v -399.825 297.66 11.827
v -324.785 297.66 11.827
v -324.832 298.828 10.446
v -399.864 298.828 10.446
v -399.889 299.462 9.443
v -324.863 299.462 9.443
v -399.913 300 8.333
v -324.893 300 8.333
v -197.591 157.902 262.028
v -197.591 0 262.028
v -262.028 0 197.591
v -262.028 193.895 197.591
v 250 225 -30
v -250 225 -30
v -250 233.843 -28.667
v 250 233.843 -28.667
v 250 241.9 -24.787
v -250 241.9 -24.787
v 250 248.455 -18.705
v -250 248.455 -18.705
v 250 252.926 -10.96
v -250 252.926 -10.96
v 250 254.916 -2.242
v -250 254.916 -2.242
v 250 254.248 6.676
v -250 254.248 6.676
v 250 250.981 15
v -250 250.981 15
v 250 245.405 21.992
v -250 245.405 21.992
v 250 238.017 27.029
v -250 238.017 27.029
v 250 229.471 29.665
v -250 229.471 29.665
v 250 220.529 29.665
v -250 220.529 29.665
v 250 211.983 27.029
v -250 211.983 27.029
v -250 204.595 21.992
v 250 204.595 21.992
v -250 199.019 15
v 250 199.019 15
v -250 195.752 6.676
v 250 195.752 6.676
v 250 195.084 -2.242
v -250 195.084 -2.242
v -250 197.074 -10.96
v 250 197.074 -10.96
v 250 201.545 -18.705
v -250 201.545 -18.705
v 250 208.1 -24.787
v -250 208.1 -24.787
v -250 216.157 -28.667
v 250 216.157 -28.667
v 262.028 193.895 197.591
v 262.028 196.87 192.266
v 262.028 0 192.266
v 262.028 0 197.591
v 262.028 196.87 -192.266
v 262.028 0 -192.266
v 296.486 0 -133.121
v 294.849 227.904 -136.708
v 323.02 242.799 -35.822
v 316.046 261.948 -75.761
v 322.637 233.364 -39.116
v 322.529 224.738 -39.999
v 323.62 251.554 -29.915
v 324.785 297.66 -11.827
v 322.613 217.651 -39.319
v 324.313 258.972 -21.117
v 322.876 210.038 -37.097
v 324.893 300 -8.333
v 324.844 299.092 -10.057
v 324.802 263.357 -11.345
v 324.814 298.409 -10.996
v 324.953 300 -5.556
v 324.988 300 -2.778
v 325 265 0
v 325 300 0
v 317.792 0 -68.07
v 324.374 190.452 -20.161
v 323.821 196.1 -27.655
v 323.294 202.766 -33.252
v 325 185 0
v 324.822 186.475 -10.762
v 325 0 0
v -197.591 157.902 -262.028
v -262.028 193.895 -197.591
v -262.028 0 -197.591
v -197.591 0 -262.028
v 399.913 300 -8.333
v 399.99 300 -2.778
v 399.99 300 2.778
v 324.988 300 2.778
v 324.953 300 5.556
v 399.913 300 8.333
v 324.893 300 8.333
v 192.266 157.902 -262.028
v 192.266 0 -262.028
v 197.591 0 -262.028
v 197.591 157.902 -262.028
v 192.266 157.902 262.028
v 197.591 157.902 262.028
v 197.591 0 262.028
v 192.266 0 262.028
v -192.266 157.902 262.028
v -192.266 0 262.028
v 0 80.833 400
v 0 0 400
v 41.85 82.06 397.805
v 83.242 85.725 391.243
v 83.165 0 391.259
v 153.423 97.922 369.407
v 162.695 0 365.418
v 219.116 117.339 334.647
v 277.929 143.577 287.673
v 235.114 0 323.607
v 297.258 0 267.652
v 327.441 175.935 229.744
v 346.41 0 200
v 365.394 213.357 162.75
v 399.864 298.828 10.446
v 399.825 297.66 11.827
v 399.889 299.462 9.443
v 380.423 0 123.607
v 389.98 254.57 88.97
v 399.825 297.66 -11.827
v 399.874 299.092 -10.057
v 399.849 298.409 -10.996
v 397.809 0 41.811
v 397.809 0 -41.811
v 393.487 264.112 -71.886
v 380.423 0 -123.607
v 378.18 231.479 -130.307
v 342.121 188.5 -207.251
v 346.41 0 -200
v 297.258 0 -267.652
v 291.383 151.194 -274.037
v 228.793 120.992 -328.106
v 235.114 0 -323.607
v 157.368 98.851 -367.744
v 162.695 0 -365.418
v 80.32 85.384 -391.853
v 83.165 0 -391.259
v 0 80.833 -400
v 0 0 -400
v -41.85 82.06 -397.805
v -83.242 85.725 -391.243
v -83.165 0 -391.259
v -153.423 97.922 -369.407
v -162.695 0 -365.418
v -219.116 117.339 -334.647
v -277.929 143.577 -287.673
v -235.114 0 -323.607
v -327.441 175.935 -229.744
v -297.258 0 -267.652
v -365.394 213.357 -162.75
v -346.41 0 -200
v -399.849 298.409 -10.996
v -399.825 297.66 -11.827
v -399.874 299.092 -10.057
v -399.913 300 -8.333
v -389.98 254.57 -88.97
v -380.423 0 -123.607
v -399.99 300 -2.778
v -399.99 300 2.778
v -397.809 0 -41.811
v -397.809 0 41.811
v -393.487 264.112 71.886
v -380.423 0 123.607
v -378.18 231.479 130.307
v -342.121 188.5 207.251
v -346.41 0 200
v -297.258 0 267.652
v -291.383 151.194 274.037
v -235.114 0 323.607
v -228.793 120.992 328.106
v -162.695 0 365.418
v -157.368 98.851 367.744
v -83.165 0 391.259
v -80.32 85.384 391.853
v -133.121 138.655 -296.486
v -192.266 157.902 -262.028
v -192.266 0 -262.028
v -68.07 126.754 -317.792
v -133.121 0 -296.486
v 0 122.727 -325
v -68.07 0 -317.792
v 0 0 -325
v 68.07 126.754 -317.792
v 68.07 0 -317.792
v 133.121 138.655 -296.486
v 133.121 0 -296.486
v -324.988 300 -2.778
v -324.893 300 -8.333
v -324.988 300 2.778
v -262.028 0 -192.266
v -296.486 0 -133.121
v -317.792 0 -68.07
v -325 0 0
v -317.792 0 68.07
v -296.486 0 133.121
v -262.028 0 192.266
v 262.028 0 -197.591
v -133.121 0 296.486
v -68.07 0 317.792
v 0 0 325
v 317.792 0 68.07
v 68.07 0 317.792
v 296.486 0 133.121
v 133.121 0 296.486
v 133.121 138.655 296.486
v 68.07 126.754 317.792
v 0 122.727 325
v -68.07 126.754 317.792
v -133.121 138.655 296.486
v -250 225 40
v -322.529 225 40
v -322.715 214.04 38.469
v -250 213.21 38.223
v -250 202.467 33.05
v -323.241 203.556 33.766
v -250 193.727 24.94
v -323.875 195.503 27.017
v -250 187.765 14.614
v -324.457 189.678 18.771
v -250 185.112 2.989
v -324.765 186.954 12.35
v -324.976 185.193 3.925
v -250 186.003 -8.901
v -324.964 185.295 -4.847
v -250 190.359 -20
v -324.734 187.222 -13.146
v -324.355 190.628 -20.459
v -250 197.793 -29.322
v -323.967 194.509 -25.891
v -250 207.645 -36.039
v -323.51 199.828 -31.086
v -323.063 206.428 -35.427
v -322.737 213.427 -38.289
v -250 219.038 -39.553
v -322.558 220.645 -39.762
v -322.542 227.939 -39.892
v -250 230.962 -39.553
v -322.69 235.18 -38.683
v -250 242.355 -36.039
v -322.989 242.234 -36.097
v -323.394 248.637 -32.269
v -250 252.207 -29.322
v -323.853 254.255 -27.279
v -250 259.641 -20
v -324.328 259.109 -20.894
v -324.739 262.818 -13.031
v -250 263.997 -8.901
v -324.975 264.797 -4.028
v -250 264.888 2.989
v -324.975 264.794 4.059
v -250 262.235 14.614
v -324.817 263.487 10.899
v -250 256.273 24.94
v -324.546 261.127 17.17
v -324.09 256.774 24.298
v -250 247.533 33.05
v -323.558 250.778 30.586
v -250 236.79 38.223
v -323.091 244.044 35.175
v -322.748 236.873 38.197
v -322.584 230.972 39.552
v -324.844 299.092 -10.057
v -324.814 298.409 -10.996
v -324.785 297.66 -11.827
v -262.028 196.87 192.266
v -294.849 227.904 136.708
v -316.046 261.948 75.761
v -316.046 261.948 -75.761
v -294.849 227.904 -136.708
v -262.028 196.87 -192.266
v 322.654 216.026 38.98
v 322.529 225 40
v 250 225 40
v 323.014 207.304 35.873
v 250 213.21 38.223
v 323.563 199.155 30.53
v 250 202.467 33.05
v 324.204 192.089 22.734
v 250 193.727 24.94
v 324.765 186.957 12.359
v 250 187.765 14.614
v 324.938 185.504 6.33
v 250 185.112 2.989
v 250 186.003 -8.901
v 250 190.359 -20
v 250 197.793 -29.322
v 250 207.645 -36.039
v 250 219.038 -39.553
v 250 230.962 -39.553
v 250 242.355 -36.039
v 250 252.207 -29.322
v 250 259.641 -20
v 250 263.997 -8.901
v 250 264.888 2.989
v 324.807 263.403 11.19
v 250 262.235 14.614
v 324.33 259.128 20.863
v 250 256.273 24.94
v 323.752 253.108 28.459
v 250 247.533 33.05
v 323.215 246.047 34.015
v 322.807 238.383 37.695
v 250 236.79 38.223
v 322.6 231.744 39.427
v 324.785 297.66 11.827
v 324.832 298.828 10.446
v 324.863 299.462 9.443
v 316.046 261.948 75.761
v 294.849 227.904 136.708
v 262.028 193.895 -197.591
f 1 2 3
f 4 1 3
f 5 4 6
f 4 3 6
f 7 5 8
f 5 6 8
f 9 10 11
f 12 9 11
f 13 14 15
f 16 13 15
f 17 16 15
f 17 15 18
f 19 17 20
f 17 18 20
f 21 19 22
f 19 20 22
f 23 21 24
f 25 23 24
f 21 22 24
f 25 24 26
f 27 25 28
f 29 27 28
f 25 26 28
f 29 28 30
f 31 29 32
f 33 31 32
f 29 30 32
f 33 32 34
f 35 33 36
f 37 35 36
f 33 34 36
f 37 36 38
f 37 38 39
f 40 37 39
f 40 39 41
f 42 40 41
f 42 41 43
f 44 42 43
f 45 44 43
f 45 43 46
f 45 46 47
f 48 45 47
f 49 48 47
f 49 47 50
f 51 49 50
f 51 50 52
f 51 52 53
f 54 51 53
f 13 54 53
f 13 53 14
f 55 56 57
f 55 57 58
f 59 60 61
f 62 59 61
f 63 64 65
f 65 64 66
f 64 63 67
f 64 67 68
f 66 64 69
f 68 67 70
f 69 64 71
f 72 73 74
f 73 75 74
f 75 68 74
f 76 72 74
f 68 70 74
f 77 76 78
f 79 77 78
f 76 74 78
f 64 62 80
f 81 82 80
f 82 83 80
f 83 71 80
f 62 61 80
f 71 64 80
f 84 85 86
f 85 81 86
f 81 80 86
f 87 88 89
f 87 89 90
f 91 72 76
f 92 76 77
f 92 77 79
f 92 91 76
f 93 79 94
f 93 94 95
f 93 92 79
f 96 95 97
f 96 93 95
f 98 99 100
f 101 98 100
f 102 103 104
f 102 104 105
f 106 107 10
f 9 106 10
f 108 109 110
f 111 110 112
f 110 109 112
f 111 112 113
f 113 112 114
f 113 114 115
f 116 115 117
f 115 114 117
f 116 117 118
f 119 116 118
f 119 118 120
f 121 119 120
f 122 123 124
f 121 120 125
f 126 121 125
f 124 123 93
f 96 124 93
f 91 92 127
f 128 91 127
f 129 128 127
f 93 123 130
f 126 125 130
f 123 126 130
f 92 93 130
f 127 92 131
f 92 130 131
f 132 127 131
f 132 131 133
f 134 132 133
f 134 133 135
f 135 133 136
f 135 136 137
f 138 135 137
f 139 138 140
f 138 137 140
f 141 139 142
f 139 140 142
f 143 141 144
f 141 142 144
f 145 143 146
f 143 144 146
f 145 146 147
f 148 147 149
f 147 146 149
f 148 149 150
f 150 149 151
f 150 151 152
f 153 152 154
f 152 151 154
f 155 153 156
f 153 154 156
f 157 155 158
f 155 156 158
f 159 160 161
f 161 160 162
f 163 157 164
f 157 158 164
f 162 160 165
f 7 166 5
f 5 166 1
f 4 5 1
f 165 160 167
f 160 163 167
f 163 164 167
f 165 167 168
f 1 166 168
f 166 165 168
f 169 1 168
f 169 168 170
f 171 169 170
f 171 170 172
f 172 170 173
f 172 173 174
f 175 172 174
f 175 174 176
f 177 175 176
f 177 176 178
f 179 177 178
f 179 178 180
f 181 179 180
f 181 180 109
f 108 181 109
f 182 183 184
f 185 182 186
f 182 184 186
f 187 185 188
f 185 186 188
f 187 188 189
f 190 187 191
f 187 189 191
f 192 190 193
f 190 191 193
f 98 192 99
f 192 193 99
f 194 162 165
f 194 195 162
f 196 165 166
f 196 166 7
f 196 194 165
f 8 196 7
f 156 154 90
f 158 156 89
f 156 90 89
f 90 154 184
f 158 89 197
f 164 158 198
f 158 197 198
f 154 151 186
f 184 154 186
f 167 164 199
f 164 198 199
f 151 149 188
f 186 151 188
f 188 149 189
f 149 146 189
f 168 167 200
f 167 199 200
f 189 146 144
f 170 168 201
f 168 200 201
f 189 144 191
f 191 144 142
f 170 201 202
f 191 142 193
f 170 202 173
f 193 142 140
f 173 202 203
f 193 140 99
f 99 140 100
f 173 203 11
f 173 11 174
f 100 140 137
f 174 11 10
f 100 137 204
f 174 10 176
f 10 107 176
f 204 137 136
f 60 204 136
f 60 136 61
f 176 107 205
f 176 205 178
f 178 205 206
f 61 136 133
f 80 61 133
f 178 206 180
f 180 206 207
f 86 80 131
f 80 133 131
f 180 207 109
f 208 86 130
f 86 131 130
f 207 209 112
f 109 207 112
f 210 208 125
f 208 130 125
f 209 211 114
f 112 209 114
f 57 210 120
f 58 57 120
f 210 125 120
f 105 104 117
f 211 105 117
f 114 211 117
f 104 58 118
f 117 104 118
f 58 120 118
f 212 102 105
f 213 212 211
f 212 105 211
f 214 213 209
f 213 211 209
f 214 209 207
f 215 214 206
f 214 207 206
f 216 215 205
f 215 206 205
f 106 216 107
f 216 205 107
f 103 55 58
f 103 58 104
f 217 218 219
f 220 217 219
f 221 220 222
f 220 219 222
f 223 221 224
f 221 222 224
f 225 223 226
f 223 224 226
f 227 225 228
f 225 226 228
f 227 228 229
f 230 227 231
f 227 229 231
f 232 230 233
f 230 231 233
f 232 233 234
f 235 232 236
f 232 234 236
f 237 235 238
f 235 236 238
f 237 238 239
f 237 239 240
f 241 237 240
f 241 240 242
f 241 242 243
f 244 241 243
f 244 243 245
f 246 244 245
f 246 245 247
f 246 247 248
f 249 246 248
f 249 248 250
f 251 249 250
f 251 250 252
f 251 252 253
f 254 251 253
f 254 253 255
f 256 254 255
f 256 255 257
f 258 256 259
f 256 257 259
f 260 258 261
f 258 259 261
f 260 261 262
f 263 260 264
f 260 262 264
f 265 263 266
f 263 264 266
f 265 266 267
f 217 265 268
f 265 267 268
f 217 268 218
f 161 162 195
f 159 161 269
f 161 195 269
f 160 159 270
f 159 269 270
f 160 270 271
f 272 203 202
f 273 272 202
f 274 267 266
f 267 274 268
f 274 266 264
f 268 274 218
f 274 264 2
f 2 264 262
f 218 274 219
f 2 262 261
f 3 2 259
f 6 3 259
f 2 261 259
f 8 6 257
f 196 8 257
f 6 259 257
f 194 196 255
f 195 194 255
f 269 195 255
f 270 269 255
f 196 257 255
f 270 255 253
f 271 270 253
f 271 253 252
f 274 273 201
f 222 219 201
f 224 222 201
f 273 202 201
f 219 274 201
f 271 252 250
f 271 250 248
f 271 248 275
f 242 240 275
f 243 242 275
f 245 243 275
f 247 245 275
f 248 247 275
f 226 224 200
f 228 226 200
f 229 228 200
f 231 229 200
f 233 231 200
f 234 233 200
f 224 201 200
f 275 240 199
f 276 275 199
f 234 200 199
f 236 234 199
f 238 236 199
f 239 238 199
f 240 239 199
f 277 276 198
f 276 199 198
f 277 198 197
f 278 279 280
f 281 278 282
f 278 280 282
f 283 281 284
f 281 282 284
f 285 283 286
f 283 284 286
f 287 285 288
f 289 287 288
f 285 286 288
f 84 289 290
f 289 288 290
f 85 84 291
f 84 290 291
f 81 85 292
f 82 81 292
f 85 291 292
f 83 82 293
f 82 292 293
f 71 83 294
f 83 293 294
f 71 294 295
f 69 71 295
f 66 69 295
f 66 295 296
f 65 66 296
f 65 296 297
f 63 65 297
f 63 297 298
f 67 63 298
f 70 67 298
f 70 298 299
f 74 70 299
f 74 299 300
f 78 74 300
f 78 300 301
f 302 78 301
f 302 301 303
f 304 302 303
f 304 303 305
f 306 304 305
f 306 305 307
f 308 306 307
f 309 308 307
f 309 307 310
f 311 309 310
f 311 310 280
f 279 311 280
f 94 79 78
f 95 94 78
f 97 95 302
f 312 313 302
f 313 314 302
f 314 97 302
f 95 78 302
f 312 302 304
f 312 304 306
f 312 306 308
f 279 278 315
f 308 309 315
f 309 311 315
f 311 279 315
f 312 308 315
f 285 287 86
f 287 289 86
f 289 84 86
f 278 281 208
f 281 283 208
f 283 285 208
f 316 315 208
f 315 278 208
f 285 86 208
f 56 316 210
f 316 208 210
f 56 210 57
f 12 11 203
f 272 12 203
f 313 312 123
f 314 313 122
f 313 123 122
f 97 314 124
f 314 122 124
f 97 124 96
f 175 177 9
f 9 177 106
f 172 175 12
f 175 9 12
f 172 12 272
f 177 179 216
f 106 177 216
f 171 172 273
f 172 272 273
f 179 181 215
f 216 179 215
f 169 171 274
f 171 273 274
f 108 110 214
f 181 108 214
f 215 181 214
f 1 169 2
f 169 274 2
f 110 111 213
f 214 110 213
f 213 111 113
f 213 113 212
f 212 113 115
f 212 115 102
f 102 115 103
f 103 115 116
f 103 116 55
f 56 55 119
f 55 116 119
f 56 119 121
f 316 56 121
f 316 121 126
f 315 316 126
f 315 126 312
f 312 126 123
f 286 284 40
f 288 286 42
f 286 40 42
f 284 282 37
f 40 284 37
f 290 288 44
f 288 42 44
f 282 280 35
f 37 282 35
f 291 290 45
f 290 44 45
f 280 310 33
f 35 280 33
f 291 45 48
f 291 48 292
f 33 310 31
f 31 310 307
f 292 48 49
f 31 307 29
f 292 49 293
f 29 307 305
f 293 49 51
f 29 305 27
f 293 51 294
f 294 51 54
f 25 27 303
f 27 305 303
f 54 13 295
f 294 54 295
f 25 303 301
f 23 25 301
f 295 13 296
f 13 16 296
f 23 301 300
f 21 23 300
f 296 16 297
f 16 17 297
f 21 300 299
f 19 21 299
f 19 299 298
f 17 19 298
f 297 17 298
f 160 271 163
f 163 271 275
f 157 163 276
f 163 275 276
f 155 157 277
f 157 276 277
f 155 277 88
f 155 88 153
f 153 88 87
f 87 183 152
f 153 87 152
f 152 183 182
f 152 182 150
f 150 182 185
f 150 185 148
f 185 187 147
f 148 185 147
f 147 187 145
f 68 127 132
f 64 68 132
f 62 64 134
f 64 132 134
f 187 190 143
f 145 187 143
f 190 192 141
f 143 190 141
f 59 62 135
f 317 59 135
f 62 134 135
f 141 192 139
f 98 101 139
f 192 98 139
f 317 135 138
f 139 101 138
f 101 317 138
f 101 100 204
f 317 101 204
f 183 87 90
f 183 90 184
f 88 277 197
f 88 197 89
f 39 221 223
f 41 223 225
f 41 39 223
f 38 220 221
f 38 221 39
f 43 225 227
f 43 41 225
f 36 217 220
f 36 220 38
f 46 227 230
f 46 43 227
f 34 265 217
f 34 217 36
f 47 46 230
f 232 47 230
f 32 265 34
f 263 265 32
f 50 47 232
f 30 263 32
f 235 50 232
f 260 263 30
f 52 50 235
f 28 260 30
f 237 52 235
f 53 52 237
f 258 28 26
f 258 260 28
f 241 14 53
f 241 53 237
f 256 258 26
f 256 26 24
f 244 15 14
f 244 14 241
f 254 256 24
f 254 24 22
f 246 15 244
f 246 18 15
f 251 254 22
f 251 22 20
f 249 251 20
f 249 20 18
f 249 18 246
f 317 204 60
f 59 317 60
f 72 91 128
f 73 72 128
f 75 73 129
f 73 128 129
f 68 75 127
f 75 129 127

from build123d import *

# Parameters (mm, degrees)
ESQUISSE2_R             = 400
BOSS_EXTRU_1_DEPTH      = 300
ENL_V_MAT_EXTRU_1_DEPTH = 575
ENL_V_START             = 705
ENL_V_MAT_EXTRU_2_DEPTH = 705
ESQUISSE9_R             = 40
BOSS_EXTRU_10_DEPTH     = 350
BOSS_EXTRU_11_START     = -350
ESQUISSE9_4_R           = 40
BOSS_EXTRU_11_DEPTH     = 350
ENL_V_START_2           = -250
ESQUISSE10_R            = 40
ESQUISSE10_R_2          = 30
ENL_V_MAT_EXTRU_3_DEPTH = 250
ESQUISSE10_2_R          = 40
ESQUISSE10_2_R_2        = 30
ENL_V_MAT_EXTRU_4_DEPTH = 250


with BuildPart() as part:
    # Esquisse2 → Boss.-Extru.1 (new body)
    with BuildSketch(Plane(origin=(0, 0, 0), x_dir=(1, 0, 0), z_dir=(0, 1, 0))):
        Circle(ESQUISSE2_R)
        with BuildLine():
            Line((-262.027957955, 192.26634976), (-262.027957955, 197.591449816))
            Line((-262.027957955, 197.591449816), (-229.809703961, 229.80970381))
            Line((-229.809703961, 229.80970381), (-197.591449816, 262.027957955))
            Line((-197.591449816, 262.027957955), (-192.26634976, 262.027957955))
            ThreePointArc((-192.26634976, 262.027957955), (0, 325), (192.26634976, 262.027957955))
            Line((192.26634976, 262.027957955), (197.591449816, 262.027957955))
            Line((197.591449816, 262.027957955), (229.809703566, 229.809704205))
            Line((229.809703566, 229.809704205), (262.027957955, 197.591449816))
            Line((262.027957955, 197.591449816), (262.027957955, 192.26634976))
            ThreePointArc((262.027957955, 192.26634976), (308.856023363, 101.158078433), (325, 0))
            ThreePointArc((325, 0), (308.856023363, -101.158078433), (262.027957955, -192.26634976))
            Line((262.027957955, -192.26634976), (262.027957955, -197.591449816))
            Line((262.027957955, -197.591449816), (229.809704204, -229.809703567))
            Line((229.809704204, -229.809703567), (197.591449816, -262.027957955))
            Line((197.591449816, -262.027957955), (192.26634976, -262.027957955))
            ThreePointArc((192.26634976, -262.027957955), (0, -325), (-192.26634976, -262.027957955))
            Line((-192.26634976, -262.027957955), (-197.591449816, -262.027957955))
            Line((-197.591449816, -262.027957955), (-229.809704607, -229.809703164))
            Line((-229.809704607, -229.809703164), (-262.027957955, -197.591449816))
            Line((-262.027957955, -197.591449816), (-262.027957955, -192.26634976))
            ThreePointArc((-262.027957955, -192.26634976), (-325, 0), (-262.027957955, 192.26634976))
        make_face(mode=Mode.SUBTRACT)
    extrude(amount=BOSS_EXTRU_1_DEPTH)

    # Esquisse3 → Enlèv. mat.-Extru.1 (cut)
    with BuildSketch(Plane(origin=(0, 0, 0), x_dir=(0, 0, -1), z_dir=(1, 0, 0))):
        with BuildLine():
            Line((400, 300.833333333), (4.166666667, 300.833333333))
            ThreePointArc((4.166666667, 300.833333333), (8.312403851, 300.008694936), (11.82699013, 297.660323463))
            Line((11.82699013, 297.660323463), (400, 80.833333333))
            Line((400, 80.833333333), (400, 300.833333333))
        make_face()
        with BuildLine():
            ThreePointArc((-11.82699013, 297.660323463), (-8.312403851, 300.008694936), (-4.166666667, 300.833333333))
            Line((-4.166666667, 300.833333333), (-400, 300.833333333))
            Line((-400, 300.833333333), (-400, 80.833333333))
            Line((-400, 80.833333333), (-11.82699013, 297.660323463))
        make_face()
    extrude(amount=-ENL_V_MAT_EXTRU_1_DEPTH, mode=Mode.SUBTRACT)

    # Esquisse3<3> → Enlèv. mat.-Extru.2 (cut)
    with BuildSketch(Plane(origin=(0, 0, 0), x_dir=(0, 0, -1), z_dir=(1, 0, 0)).offset(ENL_V_START)):
        with BuildLine():
            Line((400, 300.833333333), (4.166666667, 300.833333333))
            ThreePointArc((4.166666667, 300.833333333), (8.312403851, 300.008694936), (11.82699013, 297.660323463))
            Line((11.82699013, 297.660323463), (400, 80.833333333))
            Line((400, 80.833333333), (400, 300.833333333))
        make_face()
        with BuildLine():
            ThreePointArc((-11.82699013, 297.660323463), (-8.312403851, 300.008694936), (-4.166666667, 300.833333333))
            Line((-4.166666667, 300.833333333), (-400, 300.833333333))
            Line((-400, 300.833333333), (-400, 80.833333333))
            Line((-400, 80.833333333), (-11.82699013, 297.660323463))
        make_face()
    extrude(amount=-ENL_V_MAT_EXTRU_2_DEPTH, mode=Mode.SUBTRACT)

    # Esquisse9 → Boss.-Extru.10 (add)
    with BuildSketch(Plane(origin=(0, 0, 0), x_dir=(0, 0, -1), z_dir=(1, 0, 0))):
        with Locations((0, 225)):
            Circle(ESQUISSE9_R)
    extrude(amount=BOSS_EXTRU_10_DEPTH)

    # Esquisse9<4> → Boss.-Extru.11 (add)
    with BuildSketch(Plane(origin=(0, 0, 0), x_dir=(0, 0, -1), z_dir=(1, 0, 0)).offset(BOSS_EXTRU_11_START)):
        with Locations((0, 225)):
            Circle(ESQUISSE9_4_R)
    extrude(amount=BOSS_EXTRU_11_DEPTH)

    # Esquisse10 → Enlèv. mat.-Extru.3 (cut)
    with BuildSketch(Plane(origin=(0, 0, 0), x_dir=(0, 0, -1), z_dir=(1, 0, 0)).offset(ENL_V_START_2)):
        with Locations((0, 225)):
            Circle(ESQUISSE10_R)
        with Locations((0, 225)):
            Circle(ESQUISSE10_R_2, mode=Mode.SUBTRACT)
    extrude(amount=ENL_V_MAT_EXTRU_3_DEPTH, mode=Mode.SUBTRACT)

    # Esquisse10<2> → Enlèv. mat.-Extru.4 (cut)
    with BuildSketch(Plane(origin=(0, 0, 0), x_dir=(0, 0, -1), z_dir=(1, 0, 0))):
        with Locations((0, 225)):
            Circle(ESQUISSE10_2_R)
        with Locations((0, 225)):
            Circle(ESQUISSE10_2_R_2, mode=Mode.SUBTRACT)
    extrude(amount=ENL_V_MAT_EXTRU_4_DEPTH, mode=Mode.SUBTRACT)


solid = part.part
